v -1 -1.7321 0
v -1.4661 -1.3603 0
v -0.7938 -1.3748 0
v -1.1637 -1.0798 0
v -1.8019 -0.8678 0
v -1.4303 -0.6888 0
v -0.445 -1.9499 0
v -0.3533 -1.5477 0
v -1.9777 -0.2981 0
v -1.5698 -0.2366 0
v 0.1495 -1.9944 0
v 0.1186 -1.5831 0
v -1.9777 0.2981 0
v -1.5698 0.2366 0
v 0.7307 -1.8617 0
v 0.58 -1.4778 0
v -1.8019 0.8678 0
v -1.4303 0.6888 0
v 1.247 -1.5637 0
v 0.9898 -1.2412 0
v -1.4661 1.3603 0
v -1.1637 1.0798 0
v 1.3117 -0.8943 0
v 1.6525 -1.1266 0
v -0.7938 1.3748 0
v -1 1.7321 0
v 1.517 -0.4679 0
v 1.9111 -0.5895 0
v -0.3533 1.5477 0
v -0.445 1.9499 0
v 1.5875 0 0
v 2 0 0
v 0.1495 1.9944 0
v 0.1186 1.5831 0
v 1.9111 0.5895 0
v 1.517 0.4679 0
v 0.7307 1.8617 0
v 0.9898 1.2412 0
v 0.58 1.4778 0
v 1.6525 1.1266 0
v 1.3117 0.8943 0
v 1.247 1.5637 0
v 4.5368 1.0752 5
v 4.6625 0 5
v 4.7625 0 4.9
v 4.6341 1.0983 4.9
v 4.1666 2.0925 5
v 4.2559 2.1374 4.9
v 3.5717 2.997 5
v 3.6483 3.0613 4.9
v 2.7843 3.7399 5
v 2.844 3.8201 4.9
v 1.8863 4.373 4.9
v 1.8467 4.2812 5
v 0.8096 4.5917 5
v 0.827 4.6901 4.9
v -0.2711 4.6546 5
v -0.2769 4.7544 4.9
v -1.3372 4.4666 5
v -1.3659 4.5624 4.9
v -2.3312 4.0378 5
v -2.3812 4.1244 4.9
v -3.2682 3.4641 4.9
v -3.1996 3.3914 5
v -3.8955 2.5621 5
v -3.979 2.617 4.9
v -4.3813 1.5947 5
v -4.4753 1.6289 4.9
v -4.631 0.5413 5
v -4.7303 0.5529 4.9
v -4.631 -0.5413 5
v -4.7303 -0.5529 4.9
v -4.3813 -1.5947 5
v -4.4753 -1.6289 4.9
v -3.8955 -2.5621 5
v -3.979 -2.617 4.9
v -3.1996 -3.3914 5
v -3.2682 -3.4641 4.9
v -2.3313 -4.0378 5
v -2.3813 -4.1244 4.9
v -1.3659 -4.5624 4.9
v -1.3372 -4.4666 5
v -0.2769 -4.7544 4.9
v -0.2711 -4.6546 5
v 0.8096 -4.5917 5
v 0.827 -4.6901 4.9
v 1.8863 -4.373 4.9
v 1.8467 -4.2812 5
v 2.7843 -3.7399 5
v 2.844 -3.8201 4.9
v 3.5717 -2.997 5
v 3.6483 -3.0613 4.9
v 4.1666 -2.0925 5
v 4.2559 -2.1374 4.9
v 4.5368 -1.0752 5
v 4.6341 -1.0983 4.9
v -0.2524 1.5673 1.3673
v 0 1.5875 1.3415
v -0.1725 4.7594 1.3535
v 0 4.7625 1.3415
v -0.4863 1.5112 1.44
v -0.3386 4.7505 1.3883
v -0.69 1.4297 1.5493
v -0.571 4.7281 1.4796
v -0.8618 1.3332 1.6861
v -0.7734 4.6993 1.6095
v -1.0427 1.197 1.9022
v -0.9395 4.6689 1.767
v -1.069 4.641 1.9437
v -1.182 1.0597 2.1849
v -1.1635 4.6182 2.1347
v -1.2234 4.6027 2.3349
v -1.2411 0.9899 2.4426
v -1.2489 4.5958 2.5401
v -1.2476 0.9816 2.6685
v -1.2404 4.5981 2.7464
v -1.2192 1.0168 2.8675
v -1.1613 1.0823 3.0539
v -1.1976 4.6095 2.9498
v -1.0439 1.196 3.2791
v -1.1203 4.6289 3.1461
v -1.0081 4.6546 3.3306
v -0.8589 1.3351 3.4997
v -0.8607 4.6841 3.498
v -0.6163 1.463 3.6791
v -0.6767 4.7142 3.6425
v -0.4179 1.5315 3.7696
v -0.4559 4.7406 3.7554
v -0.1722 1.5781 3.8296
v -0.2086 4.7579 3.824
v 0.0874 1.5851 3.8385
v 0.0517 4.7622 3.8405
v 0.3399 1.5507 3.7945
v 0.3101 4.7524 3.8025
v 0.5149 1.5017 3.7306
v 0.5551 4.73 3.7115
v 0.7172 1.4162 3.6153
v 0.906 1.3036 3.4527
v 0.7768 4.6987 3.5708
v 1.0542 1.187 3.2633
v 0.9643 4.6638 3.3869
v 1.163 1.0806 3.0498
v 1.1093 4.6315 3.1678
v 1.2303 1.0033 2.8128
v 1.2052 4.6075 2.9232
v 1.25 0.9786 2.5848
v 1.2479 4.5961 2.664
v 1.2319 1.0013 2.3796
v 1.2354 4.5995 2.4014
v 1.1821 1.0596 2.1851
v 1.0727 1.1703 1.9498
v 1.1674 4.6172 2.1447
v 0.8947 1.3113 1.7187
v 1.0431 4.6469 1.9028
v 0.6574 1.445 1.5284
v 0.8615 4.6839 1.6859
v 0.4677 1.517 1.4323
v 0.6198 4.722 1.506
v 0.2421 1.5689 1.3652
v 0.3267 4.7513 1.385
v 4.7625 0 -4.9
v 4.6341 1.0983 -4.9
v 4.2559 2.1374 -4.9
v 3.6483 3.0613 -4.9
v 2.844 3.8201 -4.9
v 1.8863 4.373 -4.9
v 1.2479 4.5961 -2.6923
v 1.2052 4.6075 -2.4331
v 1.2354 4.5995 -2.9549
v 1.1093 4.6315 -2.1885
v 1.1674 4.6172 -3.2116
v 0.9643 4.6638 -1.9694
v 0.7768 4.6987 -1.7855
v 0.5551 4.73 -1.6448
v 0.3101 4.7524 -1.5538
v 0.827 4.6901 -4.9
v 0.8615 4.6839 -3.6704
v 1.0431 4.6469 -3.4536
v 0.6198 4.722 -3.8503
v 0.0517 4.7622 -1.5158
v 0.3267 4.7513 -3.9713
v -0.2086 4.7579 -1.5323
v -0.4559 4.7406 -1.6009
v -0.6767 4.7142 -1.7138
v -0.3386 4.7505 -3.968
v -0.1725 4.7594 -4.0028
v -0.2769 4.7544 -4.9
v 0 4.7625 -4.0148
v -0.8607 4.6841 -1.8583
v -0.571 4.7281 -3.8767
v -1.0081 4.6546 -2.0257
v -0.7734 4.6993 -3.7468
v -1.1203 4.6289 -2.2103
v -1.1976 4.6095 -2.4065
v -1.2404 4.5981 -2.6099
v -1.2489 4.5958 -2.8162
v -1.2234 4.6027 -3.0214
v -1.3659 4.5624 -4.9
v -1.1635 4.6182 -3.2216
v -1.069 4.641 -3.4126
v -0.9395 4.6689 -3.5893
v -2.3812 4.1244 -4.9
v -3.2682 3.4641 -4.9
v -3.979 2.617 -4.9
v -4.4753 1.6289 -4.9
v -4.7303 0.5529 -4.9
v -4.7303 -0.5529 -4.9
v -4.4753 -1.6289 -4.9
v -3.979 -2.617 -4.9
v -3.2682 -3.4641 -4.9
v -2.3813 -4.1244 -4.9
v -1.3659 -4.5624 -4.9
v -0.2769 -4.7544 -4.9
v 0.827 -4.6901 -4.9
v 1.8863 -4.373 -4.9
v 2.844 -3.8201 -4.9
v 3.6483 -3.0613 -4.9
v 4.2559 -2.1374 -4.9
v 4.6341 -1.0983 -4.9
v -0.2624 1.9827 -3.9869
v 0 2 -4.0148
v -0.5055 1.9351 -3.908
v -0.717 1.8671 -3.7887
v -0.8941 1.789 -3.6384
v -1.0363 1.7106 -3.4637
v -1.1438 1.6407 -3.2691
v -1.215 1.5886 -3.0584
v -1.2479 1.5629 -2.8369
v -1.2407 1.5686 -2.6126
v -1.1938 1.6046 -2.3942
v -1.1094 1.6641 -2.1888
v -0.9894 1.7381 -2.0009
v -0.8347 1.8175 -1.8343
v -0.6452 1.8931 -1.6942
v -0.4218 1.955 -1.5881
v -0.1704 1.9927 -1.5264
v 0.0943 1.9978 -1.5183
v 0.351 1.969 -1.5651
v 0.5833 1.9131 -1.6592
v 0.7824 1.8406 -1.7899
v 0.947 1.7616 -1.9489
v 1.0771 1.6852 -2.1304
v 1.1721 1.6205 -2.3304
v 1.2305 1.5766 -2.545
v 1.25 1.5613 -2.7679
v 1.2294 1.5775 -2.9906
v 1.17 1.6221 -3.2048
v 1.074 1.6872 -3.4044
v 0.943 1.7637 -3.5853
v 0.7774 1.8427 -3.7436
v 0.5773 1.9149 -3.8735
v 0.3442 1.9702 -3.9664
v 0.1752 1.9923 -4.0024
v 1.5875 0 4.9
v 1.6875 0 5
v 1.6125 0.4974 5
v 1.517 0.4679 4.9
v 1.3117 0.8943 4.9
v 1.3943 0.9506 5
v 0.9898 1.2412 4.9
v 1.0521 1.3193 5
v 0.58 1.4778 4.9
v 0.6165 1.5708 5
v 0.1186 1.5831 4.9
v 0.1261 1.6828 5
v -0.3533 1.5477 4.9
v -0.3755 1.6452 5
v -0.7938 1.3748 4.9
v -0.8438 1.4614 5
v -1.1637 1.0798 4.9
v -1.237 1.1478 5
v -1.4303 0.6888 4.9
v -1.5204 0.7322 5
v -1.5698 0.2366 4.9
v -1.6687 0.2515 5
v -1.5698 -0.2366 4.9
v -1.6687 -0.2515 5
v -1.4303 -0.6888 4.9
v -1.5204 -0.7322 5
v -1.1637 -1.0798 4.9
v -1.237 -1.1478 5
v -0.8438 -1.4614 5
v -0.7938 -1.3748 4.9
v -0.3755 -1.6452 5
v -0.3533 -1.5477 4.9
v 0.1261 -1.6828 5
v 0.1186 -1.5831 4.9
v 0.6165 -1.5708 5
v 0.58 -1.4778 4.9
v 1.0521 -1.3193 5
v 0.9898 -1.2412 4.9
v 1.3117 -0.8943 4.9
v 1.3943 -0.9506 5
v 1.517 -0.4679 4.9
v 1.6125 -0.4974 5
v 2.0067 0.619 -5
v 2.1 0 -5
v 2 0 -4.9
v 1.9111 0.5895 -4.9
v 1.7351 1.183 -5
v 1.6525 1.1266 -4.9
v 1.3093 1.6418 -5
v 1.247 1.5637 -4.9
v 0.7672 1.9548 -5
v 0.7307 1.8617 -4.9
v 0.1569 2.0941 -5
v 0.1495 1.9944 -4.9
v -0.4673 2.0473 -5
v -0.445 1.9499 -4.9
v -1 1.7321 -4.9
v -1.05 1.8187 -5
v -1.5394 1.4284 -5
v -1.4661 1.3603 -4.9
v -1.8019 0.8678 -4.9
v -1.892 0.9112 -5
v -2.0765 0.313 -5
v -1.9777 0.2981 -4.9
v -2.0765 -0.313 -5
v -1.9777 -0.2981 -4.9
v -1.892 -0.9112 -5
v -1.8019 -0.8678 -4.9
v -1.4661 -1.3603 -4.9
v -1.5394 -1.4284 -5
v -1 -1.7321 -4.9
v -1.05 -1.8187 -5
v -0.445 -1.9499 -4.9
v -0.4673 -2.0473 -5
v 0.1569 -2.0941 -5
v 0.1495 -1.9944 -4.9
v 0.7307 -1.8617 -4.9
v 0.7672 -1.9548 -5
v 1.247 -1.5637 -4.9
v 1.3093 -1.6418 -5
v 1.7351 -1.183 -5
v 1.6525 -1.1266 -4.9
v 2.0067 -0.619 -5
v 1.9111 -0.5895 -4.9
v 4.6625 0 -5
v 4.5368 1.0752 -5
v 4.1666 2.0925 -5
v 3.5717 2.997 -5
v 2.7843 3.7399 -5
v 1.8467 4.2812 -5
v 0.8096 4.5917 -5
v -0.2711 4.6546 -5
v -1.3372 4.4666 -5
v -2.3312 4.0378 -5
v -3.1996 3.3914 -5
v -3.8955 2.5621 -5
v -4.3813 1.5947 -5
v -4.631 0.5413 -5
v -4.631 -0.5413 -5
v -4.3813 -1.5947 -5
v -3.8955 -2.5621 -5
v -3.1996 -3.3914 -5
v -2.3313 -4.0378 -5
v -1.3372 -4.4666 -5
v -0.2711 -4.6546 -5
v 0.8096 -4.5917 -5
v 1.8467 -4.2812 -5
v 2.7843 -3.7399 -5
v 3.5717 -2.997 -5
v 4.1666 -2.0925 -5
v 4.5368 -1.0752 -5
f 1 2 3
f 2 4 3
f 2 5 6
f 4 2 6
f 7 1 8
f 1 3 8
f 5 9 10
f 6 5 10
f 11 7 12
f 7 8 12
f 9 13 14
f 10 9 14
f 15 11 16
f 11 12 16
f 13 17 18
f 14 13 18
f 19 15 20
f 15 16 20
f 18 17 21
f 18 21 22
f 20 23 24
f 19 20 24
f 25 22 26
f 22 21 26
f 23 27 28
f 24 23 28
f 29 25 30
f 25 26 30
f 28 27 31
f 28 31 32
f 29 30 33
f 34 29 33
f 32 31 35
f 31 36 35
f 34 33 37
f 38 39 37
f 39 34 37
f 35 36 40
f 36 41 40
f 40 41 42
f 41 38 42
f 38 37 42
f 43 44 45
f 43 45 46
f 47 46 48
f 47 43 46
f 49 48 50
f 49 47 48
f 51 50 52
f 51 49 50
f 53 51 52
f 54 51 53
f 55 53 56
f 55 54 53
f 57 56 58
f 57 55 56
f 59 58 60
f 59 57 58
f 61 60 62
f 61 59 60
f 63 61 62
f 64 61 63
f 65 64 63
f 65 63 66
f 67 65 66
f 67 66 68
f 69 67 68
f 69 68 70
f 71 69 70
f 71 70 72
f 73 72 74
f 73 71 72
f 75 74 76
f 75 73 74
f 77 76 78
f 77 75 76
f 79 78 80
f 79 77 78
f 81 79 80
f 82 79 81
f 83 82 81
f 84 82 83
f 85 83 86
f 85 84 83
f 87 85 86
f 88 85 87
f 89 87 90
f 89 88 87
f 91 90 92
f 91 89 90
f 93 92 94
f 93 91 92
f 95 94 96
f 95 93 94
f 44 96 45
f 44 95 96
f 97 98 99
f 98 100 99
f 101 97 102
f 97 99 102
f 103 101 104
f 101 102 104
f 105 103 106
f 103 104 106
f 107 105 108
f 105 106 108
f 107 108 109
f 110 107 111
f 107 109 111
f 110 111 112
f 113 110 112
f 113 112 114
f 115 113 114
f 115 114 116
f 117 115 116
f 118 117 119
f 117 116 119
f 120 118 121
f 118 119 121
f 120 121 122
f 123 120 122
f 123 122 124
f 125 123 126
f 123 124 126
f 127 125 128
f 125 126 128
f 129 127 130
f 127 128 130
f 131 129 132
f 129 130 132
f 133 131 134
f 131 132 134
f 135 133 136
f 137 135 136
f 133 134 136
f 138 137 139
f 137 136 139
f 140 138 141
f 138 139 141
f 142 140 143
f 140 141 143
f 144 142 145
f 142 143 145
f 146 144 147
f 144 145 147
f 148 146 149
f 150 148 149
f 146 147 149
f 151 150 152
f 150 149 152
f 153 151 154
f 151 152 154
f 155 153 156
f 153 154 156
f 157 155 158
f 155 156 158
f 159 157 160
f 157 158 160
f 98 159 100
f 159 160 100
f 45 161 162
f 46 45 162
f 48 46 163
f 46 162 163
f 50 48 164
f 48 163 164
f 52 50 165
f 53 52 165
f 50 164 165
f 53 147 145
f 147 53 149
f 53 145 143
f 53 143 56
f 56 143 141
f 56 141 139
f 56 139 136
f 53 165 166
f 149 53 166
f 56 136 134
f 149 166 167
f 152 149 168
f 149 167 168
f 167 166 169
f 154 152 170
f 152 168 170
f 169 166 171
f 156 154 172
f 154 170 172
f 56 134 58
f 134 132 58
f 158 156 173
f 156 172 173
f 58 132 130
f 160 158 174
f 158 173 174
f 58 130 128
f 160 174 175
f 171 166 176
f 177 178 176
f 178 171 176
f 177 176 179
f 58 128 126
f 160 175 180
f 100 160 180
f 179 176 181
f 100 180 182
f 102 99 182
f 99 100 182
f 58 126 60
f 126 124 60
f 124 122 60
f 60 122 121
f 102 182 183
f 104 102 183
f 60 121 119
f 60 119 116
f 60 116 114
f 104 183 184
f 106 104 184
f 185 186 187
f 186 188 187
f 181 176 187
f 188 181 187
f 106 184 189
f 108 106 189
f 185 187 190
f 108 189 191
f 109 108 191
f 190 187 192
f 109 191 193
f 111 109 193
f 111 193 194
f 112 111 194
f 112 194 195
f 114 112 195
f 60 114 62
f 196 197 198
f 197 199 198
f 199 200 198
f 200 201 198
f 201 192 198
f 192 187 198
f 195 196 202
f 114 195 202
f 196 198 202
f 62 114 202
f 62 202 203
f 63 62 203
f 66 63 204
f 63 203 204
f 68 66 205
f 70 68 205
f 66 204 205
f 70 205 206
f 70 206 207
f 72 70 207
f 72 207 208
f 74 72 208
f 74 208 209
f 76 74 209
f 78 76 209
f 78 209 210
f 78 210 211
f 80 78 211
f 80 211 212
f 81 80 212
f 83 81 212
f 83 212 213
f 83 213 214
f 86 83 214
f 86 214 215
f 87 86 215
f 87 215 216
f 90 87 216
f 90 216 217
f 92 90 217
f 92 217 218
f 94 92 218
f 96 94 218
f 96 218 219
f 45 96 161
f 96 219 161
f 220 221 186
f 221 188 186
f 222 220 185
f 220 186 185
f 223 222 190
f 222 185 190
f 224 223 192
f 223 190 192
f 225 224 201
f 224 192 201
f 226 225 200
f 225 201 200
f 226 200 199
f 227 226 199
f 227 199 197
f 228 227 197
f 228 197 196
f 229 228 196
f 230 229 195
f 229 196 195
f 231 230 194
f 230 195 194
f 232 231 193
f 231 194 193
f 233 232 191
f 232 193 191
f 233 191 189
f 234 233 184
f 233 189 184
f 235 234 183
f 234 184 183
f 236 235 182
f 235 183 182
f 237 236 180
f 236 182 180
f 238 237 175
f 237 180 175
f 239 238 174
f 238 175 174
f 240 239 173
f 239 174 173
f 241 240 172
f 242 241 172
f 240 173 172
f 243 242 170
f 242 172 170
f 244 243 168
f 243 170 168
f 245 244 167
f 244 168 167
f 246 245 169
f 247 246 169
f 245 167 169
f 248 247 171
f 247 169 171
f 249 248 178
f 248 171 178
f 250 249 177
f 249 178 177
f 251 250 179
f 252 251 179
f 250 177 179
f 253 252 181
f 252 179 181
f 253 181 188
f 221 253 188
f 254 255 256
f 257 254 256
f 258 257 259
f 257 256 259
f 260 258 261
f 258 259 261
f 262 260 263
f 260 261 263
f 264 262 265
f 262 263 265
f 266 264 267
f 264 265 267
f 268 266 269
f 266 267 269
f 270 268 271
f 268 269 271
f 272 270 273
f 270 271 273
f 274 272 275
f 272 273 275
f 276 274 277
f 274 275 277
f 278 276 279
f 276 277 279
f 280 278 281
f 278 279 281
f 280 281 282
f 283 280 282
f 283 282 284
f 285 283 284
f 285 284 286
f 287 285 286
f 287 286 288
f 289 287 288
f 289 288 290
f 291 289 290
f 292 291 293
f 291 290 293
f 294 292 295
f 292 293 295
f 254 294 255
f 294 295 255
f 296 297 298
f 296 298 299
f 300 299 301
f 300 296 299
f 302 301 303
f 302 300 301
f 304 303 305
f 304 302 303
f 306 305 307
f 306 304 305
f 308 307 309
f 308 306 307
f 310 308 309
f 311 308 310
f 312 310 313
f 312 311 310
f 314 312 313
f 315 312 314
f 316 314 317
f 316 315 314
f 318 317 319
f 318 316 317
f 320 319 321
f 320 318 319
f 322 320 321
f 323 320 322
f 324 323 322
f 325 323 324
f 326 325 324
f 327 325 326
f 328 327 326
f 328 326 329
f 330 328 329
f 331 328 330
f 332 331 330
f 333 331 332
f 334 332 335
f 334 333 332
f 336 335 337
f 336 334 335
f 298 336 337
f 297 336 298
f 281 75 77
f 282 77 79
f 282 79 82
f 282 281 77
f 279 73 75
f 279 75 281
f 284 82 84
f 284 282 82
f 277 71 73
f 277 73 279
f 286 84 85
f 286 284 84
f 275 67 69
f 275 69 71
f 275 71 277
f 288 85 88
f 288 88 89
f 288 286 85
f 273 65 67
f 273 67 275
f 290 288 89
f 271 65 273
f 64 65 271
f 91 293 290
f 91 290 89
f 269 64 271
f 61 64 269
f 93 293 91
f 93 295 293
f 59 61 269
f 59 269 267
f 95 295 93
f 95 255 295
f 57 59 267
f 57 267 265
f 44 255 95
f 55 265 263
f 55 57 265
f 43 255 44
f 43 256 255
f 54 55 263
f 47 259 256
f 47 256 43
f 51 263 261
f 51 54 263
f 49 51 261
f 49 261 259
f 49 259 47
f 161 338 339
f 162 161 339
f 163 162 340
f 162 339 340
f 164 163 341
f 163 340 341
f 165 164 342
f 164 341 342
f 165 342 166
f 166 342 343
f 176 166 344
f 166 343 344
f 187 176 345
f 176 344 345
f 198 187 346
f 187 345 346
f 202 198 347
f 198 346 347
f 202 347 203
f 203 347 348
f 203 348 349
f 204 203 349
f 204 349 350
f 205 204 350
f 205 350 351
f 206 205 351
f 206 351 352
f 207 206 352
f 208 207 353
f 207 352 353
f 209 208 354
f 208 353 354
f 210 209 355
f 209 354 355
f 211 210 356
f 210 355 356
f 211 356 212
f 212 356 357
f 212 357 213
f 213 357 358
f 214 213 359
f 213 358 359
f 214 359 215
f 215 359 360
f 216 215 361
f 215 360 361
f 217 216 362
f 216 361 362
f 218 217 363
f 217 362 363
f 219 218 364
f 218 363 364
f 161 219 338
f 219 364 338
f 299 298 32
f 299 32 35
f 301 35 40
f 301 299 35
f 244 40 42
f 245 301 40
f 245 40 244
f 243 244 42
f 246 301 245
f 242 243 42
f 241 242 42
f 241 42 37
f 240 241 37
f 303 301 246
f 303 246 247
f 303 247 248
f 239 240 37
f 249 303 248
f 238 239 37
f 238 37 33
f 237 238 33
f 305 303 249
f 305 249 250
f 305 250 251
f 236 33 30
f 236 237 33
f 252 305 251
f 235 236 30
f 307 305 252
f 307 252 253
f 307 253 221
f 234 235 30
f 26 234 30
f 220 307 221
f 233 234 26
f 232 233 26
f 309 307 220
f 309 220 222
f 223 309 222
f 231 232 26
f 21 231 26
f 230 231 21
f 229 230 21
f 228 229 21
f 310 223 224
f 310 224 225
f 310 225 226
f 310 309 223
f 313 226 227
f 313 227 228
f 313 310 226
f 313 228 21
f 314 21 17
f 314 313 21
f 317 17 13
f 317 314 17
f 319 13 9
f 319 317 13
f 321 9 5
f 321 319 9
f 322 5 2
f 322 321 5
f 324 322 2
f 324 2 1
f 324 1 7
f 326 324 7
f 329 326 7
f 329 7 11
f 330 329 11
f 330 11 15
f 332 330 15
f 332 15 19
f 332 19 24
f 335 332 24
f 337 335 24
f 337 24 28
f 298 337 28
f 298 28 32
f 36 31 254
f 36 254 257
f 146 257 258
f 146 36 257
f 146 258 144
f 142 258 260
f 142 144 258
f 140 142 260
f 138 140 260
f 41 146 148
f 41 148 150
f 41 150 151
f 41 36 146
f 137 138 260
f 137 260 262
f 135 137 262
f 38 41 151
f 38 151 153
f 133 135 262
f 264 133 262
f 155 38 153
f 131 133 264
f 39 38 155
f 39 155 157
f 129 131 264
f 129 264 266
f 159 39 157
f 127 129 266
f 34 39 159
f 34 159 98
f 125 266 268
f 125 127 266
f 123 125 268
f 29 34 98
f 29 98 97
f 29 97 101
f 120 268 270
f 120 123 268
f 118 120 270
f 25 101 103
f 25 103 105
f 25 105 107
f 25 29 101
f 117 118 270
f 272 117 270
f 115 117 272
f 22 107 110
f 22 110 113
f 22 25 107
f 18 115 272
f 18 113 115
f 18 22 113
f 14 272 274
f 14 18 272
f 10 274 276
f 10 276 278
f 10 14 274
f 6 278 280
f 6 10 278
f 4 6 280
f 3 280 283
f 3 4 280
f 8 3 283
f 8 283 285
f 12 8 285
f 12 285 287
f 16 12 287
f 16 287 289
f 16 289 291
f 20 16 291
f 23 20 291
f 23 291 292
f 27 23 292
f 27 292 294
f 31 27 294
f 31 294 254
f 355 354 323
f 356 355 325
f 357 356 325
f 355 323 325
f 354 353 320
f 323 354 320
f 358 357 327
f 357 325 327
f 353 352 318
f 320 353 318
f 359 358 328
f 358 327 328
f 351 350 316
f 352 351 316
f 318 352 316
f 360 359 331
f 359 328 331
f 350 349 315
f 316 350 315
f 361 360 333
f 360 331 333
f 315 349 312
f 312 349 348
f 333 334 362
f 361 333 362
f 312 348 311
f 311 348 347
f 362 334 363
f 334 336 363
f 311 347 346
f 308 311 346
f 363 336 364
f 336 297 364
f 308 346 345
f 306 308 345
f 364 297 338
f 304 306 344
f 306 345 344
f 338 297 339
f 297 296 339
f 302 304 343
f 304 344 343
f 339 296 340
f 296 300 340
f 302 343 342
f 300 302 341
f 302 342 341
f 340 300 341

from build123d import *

# Parameters (mm, degrees)
SKETCH1_R                      = 4.7625
SKETCH1_R_2                    = 1.5875
BOSS_EXTRUDE1_DEPTH            = 5
BOSS_EXTRUDE2_START            = -5
SKETCH1_3_R                    = 4.7625
SKETCH1_3_R_2                  = 2
BOSS_EXTRUDE2_DEPTH            = 5
SKETCH3_W                      = 1.25
SKETCH3_H                      = 4.7625
M3X0_5_TAPPED_HOLE1_AT_2_COUNT = 2
M3X0_5_TAPPED_HOLE1_AT_2_PITCH = 5.356303923
CHAMFER1_SIZE                  = 0.1


with BuildPart() as part:
    # Sketch1 → Boss-Extrude1 (new body)
    with BuildSketch(Plane.XY):
        Circle(SKETCH1_R)
        Circle(SKETCH1_R_2, mode=Mode.SUBTRACT)
    extrude(amount=BOSS_EXTRUDE1_DEPTH)

    # Sketch1<3> → Boss-Extrude2 (add)
    with BuildSketch(Plane.XY.offset(BOSS_EXTRUDE2_START)):
        Circle(SKETCH1_3_R)
        Circle(SKETCH1_3_R_2, mode=Mode.SUBTRACT)
    extrude(amount=BOSS_EXTRUDE2_DEPTH)

    # Sketch3 → M3x0.5 Tapped Hole1 (revolve, cut)
    with BuildSketch(Plane(origin=(0, 0, 2.591545057), x_dir=(0, 0, -1), z_dir=(1, 0, 0))):
        with Locations((0.625, 2.38125)):
            Rectangle(SKETCH3_W, SKETCH3_H)
    m3x0_5_tapped_hole1 = revolve(axis=Axis((0, -6.35, 2.591545057), (0, 1, 0)), mode=Mode.SUBTRACT)

    # M3x0.5 Tapped Hole1 at 2: M3x0.5 Tapped Hole1 ×2
    with Locations(*[(0, 0, -i * M3X0_5_TAPPED_HOLE1_AT_2_PITCH) for i in range(1, M3X0_5_TAPPED_HOLE1_AT_2_COUNT)]):
        add(m3x0_5_tapped_hole1, mode=Mode.SUBTRACT)

    # Chamfer1
    chamfer1_edges = [part.edges().sort_by_distance(p)[0] for p in [
        (-4.7625, 0, -5),
        (-2, 0, -5),
        (-4.7625, 0, 5),
        (-1.5875, 0, 5),
    ]]
    chamfer(chamfer1_edges, length=CHAMFER1_SIZE)


solid = part.part
